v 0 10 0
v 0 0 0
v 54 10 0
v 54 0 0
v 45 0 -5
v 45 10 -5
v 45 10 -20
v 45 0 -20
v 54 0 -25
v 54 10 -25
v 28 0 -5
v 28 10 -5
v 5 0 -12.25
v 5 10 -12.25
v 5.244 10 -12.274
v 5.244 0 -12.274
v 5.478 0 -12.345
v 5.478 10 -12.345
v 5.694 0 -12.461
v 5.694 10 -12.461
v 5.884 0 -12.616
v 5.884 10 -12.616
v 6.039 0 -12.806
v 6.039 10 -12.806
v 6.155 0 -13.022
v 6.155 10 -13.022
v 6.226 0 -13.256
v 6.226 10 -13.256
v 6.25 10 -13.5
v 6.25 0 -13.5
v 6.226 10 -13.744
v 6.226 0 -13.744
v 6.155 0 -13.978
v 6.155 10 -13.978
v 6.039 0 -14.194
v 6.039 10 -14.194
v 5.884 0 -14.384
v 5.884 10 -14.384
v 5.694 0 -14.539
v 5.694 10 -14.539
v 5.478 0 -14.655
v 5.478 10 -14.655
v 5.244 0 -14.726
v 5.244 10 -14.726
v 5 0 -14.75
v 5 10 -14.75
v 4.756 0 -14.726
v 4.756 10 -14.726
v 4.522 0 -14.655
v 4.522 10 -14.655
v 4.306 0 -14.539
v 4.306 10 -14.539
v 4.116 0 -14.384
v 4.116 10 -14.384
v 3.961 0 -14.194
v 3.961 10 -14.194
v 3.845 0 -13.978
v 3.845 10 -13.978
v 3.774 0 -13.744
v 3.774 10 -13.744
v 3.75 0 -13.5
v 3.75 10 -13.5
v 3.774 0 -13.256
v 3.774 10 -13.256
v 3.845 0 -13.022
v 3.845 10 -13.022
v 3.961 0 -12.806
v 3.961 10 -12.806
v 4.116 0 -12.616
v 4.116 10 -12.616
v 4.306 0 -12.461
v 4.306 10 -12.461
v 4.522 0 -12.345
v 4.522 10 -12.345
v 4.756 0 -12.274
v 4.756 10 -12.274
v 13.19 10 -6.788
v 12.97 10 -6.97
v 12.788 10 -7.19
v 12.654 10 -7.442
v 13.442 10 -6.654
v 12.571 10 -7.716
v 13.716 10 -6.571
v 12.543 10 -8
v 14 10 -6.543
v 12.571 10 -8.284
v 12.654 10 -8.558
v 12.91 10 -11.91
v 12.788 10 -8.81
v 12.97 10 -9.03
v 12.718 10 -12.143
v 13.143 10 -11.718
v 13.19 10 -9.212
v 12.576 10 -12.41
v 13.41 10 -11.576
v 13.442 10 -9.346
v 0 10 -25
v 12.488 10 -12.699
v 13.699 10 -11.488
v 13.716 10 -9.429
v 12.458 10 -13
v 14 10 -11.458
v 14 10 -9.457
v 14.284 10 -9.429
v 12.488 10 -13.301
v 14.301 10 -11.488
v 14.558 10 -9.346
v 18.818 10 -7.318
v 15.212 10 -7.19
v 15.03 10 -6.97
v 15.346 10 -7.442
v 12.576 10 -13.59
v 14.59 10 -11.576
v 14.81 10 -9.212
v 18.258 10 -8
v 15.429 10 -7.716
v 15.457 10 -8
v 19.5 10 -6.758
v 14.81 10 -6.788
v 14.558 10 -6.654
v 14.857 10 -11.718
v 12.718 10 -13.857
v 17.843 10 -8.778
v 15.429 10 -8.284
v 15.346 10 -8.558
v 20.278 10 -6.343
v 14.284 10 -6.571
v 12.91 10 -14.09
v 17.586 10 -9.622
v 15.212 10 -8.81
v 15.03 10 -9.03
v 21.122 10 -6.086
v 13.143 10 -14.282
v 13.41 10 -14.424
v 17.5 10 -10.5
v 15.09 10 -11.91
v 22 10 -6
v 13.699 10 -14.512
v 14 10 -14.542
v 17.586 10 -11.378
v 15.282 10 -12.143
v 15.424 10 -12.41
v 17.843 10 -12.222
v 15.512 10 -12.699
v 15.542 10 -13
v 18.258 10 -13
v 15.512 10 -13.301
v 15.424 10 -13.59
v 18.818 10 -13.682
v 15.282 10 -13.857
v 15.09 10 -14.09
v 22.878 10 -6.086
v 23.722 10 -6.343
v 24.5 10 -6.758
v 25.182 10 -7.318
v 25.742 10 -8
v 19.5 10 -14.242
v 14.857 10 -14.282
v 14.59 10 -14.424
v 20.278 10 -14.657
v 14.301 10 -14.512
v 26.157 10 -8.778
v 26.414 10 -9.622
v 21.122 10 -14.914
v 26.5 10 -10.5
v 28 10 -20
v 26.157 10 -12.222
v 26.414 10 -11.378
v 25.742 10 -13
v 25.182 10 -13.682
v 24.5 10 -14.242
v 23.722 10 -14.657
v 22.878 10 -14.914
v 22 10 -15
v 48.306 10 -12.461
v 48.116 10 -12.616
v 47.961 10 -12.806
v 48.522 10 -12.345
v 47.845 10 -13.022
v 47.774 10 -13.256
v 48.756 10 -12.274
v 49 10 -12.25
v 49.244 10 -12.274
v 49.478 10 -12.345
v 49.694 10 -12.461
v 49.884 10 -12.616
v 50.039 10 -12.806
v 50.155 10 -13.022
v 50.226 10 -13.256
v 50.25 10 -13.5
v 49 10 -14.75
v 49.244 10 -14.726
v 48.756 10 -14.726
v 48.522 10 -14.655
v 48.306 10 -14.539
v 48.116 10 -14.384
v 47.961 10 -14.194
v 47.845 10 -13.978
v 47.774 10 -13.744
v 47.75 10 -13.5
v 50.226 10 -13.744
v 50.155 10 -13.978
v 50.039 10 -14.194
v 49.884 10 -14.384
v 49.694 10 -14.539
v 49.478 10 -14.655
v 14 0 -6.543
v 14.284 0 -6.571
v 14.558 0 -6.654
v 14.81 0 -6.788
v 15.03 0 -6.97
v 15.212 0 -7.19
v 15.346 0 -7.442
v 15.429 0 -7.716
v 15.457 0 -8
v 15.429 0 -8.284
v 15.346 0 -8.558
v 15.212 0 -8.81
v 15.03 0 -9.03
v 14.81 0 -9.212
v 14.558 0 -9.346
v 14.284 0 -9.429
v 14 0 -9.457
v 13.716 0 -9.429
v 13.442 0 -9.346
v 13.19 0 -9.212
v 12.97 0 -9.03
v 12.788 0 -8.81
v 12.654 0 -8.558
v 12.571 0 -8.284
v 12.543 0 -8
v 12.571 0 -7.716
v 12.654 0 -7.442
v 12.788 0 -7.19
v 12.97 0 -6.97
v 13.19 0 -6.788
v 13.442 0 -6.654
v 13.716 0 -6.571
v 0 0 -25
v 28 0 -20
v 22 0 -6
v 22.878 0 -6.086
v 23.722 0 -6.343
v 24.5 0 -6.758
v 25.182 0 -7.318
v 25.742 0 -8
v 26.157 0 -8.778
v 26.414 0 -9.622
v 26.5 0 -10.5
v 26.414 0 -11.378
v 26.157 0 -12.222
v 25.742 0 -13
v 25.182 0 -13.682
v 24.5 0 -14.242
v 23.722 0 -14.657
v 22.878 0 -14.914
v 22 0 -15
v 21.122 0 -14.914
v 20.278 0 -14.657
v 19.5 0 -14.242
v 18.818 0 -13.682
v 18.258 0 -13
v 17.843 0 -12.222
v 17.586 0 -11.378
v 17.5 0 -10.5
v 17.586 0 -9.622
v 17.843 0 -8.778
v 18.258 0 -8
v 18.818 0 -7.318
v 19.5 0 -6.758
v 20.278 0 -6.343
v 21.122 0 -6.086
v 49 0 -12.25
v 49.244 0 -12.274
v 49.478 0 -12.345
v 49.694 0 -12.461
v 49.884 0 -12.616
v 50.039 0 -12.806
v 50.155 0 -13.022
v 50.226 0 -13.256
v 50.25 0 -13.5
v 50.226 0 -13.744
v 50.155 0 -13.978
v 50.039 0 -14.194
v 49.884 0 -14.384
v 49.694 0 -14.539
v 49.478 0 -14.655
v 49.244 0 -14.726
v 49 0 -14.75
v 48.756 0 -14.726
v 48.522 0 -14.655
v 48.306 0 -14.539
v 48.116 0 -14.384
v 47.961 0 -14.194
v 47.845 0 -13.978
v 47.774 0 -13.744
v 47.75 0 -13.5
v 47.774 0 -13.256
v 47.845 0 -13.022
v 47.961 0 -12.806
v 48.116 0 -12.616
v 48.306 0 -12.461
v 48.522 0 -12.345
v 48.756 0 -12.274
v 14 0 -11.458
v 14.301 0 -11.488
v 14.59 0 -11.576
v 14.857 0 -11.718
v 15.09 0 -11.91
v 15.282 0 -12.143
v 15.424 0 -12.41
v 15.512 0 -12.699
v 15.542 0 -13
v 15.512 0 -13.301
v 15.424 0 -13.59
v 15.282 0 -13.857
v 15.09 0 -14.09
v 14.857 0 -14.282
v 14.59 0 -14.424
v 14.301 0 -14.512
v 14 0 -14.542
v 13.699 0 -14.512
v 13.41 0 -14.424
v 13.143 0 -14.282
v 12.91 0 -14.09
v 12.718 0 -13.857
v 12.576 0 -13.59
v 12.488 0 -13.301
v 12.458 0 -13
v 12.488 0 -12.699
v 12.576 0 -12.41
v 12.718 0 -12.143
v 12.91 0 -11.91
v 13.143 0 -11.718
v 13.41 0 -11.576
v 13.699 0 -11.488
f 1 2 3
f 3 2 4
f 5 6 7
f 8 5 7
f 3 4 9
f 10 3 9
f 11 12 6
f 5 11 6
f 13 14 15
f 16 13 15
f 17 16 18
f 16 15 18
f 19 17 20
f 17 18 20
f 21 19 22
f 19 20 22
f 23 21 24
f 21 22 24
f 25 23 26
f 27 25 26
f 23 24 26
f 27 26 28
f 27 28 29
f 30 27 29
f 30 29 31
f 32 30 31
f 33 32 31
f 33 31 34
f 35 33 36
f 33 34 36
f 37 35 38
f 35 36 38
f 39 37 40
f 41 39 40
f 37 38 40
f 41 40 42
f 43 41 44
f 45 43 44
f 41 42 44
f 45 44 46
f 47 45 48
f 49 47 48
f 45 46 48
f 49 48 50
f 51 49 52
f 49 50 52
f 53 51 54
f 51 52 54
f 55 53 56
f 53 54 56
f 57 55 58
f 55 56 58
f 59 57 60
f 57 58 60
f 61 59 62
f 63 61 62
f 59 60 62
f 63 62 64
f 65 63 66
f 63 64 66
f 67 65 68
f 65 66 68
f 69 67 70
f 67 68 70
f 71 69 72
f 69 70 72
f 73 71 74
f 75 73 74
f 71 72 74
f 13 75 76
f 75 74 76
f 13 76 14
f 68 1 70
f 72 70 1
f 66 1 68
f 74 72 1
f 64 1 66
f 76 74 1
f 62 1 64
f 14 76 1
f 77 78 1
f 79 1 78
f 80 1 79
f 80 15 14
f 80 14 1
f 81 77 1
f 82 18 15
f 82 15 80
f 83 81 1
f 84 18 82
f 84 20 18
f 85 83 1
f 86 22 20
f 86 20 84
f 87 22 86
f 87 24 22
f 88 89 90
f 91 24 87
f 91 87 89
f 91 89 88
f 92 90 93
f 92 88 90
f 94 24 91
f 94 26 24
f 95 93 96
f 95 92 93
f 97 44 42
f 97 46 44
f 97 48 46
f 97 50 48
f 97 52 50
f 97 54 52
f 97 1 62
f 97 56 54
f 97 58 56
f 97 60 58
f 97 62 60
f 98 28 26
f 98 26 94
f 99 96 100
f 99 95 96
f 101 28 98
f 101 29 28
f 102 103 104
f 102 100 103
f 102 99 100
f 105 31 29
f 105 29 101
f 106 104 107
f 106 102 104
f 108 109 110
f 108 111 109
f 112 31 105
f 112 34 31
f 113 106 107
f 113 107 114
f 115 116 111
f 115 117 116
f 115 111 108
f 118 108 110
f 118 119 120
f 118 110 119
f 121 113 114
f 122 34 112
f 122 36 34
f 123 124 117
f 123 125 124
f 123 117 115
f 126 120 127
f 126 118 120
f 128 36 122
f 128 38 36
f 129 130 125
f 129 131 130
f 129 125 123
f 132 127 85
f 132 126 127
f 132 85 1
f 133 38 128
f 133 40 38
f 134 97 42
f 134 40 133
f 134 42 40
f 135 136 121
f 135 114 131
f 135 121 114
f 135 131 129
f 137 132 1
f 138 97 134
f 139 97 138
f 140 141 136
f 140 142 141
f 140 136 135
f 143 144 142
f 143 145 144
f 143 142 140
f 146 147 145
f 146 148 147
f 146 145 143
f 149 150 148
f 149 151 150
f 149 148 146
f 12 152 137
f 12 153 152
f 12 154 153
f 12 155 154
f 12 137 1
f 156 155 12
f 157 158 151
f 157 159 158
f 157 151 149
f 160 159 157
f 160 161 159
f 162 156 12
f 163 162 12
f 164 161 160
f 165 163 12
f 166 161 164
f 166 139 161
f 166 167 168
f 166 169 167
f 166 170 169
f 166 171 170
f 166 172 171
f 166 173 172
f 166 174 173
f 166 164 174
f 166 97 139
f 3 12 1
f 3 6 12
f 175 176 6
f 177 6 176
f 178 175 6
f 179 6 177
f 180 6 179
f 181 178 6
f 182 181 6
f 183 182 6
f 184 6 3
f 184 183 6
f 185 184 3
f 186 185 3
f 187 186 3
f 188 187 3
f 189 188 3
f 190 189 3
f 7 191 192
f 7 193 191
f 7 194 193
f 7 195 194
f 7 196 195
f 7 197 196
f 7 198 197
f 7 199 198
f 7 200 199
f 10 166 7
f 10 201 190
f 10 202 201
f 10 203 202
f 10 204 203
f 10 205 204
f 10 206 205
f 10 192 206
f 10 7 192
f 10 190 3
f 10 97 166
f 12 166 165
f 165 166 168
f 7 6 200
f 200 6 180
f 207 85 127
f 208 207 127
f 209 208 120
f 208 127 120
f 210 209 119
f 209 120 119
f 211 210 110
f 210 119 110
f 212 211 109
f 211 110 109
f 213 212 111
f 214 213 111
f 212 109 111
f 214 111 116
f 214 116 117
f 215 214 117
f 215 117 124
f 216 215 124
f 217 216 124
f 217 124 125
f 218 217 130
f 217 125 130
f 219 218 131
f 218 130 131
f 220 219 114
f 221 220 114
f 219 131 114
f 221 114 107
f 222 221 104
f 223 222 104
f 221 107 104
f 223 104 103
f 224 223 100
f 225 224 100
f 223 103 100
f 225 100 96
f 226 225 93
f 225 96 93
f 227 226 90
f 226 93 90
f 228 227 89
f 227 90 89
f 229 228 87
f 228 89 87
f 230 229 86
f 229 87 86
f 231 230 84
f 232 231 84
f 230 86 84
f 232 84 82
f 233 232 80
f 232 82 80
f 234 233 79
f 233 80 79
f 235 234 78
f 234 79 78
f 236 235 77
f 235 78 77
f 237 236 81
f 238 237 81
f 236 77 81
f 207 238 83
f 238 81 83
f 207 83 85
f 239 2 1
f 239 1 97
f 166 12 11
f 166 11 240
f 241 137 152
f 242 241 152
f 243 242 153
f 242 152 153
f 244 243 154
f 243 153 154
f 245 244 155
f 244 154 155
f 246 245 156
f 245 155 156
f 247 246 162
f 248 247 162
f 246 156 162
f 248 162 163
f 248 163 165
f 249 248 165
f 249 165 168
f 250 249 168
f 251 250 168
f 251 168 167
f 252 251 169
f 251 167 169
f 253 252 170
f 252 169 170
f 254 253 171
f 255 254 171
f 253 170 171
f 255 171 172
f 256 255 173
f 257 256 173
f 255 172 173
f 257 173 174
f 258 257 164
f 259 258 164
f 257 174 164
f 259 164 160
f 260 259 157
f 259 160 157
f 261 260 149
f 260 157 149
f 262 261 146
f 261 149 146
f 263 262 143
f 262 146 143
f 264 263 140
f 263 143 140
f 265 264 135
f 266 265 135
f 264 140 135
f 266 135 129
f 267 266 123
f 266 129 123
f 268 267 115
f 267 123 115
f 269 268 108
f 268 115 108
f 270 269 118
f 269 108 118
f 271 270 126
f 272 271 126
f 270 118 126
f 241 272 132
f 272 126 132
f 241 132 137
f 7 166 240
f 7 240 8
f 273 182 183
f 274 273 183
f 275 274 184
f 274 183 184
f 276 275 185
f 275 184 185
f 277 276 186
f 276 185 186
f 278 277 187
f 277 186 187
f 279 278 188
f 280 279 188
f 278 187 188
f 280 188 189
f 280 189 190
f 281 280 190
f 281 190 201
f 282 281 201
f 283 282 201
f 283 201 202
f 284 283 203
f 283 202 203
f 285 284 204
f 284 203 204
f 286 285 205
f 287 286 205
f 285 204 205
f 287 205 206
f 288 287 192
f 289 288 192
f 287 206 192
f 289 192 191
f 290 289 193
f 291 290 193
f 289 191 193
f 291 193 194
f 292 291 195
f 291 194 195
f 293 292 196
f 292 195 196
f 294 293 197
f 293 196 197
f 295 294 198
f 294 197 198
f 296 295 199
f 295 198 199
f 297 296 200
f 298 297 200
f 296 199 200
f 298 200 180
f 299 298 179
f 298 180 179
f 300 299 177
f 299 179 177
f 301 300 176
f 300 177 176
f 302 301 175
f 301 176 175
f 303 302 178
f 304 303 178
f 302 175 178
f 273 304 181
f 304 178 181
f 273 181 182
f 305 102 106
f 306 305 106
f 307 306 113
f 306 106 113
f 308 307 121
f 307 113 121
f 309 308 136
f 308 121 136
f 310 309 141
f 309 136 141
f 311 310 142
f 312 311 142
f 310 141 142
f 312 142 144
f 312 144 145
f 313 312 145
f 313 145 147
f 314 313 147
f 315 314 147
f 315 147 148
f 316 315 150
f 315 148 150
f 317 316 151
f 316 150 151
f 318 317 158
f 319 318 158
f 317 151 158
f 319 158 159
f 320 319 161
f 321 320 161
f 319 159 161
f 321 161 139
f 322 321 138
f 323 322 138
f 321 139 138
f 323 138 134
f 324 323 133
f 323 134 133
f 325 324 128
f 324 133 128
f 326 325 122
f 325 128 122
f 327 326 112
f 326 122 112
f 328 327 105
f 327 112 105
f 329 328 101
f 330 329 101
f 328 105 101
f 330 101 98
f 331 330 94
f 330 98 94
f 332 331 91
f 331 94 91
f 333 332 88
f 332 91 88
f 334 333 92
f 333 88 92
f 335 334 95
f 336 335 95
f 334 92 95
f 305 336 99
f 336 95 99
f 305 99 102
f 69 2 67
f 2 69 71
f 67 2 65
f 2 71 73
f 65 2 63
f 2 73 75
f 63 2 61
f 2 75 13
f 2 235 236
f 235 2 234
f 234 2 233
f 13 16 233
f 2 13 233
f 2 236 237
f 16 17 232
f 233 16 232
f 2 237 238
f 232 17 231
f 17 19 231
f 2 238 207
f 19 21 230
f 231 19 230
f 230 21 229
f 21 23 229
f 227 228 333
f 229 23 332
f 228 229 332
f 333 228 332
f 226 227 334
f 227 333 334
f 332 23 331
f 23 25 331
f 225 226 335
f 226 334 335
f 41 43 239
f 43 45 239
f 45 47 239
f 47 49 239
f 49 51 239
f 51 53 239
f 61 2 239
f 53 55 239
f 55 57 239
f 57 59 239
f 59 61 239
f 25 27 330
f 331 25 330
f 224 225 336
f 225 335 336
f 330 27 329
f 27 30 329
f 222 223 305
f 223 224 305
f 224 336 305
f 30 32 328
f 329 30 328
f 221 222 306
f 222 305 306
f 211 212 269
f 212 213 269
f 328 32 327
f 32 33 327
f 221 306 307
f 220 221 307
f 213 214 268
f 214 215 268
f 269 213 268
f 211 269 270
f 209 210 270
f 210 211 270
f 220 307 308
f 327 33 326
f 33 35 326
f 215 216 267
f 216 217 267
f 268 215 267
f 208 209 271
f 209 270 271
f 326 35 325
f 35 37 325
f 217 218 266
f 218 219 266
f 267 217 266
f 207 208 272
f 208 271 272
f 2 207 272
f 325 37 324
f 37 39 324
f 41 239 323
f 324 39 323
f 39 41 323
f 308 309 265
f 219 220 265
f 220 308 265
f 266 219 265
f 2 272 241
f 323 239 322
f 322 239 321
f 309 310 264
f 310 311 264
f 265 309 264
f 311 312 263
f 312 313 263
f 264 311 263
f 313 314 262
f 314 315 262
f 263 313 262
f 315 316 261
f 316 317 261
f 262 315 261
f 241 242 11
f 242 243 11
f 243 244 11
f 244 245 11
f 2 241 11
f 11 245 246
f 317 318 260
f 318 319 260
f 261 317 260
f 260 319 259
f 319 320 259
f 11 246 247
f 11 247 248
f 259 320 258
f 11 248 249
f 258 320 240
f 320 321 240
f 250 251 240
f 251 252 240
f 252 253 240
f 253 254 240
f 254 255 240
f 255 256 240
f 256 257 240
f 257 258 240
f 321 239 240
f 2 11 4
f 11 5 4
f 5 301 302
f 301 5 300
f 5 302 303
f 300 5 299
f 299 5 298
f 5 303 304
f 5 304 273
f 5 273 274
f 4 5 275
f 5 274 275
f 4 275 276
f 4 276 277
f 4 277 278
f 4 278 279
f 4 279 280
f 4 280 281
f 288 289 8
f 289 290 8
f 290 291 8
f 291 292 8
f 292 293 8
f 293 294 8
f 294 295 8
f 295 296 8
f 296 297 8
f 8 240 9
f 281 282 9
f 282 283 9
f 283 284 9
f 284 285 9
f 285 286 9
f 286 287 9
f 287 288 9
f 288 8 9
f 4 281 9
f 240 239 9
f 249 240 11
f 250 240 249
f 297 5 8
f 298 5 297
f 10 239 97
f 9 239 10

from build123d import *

# Parameters (mm, degrees)
SKETCH1_W           = 54
SKETCH1_H           = 25
BOSS_EXTRUDE1_DEPTH = 10
SKETCH2_R           = 1.25
SKETCH2_R_2         = 4.5
SKETCH2_R_3         = 1.541692257
SKETCH2_R_4         = 1.457345452
SKETCH2_W           = 17
SKETCH2_H           = 15
CUT_EXTRUDE1_DEPTH  = 10


with BuildPart() as part:
    # Sketch1 → Boss-Extrude1 (new body)
    with BuildSketch(Plane(origin=(0, 0, 0), x_dir=(1, 0, 0), z_dir=(0, 1, 0))):
        with Locations((27, 12.5)):
            Rectangle(SKETCH1_W, SKETCH1_H)
    extrude(amount=BOSS_EXTRUDE1_DEPTH)

    # Sketch2 → Cut-Extrude1 (cut)
    with BuildSketch(Plane(origin=(0, 10, 0), x_dir=(1, 0, 0), z_dir=(0, 1, 0))):
        with Locations(Location((49, 13.5, 0), (0, 0, 270))):
            Circle(SKETCH2_R)
        with Locations(Location((5, 13.5, 0), (0, 0, 270))):
            Circle(SKETCH2_R)
        with Locations(Location((22, 10.5, 0), (0, 0, 270))):
            Circle(SKETCH2_R_2)
        with Locations(Location((14, 13, 0), (0, 0, 270))):
            Circle(SKETCH2_R_3)
        with Locations(Location((14, 8, 0), (0, 0, 270))):
            Circle(SKETCH2_R_4)
        with Locations((36.5, 12.5)):
            Rectangle(SKETCH2_W, SKETCH2_H)
    extrude(amount=-CUT_EXTRUDE1_DEPTH, mode=Mode.SUBTRACT)


solid = part.part
